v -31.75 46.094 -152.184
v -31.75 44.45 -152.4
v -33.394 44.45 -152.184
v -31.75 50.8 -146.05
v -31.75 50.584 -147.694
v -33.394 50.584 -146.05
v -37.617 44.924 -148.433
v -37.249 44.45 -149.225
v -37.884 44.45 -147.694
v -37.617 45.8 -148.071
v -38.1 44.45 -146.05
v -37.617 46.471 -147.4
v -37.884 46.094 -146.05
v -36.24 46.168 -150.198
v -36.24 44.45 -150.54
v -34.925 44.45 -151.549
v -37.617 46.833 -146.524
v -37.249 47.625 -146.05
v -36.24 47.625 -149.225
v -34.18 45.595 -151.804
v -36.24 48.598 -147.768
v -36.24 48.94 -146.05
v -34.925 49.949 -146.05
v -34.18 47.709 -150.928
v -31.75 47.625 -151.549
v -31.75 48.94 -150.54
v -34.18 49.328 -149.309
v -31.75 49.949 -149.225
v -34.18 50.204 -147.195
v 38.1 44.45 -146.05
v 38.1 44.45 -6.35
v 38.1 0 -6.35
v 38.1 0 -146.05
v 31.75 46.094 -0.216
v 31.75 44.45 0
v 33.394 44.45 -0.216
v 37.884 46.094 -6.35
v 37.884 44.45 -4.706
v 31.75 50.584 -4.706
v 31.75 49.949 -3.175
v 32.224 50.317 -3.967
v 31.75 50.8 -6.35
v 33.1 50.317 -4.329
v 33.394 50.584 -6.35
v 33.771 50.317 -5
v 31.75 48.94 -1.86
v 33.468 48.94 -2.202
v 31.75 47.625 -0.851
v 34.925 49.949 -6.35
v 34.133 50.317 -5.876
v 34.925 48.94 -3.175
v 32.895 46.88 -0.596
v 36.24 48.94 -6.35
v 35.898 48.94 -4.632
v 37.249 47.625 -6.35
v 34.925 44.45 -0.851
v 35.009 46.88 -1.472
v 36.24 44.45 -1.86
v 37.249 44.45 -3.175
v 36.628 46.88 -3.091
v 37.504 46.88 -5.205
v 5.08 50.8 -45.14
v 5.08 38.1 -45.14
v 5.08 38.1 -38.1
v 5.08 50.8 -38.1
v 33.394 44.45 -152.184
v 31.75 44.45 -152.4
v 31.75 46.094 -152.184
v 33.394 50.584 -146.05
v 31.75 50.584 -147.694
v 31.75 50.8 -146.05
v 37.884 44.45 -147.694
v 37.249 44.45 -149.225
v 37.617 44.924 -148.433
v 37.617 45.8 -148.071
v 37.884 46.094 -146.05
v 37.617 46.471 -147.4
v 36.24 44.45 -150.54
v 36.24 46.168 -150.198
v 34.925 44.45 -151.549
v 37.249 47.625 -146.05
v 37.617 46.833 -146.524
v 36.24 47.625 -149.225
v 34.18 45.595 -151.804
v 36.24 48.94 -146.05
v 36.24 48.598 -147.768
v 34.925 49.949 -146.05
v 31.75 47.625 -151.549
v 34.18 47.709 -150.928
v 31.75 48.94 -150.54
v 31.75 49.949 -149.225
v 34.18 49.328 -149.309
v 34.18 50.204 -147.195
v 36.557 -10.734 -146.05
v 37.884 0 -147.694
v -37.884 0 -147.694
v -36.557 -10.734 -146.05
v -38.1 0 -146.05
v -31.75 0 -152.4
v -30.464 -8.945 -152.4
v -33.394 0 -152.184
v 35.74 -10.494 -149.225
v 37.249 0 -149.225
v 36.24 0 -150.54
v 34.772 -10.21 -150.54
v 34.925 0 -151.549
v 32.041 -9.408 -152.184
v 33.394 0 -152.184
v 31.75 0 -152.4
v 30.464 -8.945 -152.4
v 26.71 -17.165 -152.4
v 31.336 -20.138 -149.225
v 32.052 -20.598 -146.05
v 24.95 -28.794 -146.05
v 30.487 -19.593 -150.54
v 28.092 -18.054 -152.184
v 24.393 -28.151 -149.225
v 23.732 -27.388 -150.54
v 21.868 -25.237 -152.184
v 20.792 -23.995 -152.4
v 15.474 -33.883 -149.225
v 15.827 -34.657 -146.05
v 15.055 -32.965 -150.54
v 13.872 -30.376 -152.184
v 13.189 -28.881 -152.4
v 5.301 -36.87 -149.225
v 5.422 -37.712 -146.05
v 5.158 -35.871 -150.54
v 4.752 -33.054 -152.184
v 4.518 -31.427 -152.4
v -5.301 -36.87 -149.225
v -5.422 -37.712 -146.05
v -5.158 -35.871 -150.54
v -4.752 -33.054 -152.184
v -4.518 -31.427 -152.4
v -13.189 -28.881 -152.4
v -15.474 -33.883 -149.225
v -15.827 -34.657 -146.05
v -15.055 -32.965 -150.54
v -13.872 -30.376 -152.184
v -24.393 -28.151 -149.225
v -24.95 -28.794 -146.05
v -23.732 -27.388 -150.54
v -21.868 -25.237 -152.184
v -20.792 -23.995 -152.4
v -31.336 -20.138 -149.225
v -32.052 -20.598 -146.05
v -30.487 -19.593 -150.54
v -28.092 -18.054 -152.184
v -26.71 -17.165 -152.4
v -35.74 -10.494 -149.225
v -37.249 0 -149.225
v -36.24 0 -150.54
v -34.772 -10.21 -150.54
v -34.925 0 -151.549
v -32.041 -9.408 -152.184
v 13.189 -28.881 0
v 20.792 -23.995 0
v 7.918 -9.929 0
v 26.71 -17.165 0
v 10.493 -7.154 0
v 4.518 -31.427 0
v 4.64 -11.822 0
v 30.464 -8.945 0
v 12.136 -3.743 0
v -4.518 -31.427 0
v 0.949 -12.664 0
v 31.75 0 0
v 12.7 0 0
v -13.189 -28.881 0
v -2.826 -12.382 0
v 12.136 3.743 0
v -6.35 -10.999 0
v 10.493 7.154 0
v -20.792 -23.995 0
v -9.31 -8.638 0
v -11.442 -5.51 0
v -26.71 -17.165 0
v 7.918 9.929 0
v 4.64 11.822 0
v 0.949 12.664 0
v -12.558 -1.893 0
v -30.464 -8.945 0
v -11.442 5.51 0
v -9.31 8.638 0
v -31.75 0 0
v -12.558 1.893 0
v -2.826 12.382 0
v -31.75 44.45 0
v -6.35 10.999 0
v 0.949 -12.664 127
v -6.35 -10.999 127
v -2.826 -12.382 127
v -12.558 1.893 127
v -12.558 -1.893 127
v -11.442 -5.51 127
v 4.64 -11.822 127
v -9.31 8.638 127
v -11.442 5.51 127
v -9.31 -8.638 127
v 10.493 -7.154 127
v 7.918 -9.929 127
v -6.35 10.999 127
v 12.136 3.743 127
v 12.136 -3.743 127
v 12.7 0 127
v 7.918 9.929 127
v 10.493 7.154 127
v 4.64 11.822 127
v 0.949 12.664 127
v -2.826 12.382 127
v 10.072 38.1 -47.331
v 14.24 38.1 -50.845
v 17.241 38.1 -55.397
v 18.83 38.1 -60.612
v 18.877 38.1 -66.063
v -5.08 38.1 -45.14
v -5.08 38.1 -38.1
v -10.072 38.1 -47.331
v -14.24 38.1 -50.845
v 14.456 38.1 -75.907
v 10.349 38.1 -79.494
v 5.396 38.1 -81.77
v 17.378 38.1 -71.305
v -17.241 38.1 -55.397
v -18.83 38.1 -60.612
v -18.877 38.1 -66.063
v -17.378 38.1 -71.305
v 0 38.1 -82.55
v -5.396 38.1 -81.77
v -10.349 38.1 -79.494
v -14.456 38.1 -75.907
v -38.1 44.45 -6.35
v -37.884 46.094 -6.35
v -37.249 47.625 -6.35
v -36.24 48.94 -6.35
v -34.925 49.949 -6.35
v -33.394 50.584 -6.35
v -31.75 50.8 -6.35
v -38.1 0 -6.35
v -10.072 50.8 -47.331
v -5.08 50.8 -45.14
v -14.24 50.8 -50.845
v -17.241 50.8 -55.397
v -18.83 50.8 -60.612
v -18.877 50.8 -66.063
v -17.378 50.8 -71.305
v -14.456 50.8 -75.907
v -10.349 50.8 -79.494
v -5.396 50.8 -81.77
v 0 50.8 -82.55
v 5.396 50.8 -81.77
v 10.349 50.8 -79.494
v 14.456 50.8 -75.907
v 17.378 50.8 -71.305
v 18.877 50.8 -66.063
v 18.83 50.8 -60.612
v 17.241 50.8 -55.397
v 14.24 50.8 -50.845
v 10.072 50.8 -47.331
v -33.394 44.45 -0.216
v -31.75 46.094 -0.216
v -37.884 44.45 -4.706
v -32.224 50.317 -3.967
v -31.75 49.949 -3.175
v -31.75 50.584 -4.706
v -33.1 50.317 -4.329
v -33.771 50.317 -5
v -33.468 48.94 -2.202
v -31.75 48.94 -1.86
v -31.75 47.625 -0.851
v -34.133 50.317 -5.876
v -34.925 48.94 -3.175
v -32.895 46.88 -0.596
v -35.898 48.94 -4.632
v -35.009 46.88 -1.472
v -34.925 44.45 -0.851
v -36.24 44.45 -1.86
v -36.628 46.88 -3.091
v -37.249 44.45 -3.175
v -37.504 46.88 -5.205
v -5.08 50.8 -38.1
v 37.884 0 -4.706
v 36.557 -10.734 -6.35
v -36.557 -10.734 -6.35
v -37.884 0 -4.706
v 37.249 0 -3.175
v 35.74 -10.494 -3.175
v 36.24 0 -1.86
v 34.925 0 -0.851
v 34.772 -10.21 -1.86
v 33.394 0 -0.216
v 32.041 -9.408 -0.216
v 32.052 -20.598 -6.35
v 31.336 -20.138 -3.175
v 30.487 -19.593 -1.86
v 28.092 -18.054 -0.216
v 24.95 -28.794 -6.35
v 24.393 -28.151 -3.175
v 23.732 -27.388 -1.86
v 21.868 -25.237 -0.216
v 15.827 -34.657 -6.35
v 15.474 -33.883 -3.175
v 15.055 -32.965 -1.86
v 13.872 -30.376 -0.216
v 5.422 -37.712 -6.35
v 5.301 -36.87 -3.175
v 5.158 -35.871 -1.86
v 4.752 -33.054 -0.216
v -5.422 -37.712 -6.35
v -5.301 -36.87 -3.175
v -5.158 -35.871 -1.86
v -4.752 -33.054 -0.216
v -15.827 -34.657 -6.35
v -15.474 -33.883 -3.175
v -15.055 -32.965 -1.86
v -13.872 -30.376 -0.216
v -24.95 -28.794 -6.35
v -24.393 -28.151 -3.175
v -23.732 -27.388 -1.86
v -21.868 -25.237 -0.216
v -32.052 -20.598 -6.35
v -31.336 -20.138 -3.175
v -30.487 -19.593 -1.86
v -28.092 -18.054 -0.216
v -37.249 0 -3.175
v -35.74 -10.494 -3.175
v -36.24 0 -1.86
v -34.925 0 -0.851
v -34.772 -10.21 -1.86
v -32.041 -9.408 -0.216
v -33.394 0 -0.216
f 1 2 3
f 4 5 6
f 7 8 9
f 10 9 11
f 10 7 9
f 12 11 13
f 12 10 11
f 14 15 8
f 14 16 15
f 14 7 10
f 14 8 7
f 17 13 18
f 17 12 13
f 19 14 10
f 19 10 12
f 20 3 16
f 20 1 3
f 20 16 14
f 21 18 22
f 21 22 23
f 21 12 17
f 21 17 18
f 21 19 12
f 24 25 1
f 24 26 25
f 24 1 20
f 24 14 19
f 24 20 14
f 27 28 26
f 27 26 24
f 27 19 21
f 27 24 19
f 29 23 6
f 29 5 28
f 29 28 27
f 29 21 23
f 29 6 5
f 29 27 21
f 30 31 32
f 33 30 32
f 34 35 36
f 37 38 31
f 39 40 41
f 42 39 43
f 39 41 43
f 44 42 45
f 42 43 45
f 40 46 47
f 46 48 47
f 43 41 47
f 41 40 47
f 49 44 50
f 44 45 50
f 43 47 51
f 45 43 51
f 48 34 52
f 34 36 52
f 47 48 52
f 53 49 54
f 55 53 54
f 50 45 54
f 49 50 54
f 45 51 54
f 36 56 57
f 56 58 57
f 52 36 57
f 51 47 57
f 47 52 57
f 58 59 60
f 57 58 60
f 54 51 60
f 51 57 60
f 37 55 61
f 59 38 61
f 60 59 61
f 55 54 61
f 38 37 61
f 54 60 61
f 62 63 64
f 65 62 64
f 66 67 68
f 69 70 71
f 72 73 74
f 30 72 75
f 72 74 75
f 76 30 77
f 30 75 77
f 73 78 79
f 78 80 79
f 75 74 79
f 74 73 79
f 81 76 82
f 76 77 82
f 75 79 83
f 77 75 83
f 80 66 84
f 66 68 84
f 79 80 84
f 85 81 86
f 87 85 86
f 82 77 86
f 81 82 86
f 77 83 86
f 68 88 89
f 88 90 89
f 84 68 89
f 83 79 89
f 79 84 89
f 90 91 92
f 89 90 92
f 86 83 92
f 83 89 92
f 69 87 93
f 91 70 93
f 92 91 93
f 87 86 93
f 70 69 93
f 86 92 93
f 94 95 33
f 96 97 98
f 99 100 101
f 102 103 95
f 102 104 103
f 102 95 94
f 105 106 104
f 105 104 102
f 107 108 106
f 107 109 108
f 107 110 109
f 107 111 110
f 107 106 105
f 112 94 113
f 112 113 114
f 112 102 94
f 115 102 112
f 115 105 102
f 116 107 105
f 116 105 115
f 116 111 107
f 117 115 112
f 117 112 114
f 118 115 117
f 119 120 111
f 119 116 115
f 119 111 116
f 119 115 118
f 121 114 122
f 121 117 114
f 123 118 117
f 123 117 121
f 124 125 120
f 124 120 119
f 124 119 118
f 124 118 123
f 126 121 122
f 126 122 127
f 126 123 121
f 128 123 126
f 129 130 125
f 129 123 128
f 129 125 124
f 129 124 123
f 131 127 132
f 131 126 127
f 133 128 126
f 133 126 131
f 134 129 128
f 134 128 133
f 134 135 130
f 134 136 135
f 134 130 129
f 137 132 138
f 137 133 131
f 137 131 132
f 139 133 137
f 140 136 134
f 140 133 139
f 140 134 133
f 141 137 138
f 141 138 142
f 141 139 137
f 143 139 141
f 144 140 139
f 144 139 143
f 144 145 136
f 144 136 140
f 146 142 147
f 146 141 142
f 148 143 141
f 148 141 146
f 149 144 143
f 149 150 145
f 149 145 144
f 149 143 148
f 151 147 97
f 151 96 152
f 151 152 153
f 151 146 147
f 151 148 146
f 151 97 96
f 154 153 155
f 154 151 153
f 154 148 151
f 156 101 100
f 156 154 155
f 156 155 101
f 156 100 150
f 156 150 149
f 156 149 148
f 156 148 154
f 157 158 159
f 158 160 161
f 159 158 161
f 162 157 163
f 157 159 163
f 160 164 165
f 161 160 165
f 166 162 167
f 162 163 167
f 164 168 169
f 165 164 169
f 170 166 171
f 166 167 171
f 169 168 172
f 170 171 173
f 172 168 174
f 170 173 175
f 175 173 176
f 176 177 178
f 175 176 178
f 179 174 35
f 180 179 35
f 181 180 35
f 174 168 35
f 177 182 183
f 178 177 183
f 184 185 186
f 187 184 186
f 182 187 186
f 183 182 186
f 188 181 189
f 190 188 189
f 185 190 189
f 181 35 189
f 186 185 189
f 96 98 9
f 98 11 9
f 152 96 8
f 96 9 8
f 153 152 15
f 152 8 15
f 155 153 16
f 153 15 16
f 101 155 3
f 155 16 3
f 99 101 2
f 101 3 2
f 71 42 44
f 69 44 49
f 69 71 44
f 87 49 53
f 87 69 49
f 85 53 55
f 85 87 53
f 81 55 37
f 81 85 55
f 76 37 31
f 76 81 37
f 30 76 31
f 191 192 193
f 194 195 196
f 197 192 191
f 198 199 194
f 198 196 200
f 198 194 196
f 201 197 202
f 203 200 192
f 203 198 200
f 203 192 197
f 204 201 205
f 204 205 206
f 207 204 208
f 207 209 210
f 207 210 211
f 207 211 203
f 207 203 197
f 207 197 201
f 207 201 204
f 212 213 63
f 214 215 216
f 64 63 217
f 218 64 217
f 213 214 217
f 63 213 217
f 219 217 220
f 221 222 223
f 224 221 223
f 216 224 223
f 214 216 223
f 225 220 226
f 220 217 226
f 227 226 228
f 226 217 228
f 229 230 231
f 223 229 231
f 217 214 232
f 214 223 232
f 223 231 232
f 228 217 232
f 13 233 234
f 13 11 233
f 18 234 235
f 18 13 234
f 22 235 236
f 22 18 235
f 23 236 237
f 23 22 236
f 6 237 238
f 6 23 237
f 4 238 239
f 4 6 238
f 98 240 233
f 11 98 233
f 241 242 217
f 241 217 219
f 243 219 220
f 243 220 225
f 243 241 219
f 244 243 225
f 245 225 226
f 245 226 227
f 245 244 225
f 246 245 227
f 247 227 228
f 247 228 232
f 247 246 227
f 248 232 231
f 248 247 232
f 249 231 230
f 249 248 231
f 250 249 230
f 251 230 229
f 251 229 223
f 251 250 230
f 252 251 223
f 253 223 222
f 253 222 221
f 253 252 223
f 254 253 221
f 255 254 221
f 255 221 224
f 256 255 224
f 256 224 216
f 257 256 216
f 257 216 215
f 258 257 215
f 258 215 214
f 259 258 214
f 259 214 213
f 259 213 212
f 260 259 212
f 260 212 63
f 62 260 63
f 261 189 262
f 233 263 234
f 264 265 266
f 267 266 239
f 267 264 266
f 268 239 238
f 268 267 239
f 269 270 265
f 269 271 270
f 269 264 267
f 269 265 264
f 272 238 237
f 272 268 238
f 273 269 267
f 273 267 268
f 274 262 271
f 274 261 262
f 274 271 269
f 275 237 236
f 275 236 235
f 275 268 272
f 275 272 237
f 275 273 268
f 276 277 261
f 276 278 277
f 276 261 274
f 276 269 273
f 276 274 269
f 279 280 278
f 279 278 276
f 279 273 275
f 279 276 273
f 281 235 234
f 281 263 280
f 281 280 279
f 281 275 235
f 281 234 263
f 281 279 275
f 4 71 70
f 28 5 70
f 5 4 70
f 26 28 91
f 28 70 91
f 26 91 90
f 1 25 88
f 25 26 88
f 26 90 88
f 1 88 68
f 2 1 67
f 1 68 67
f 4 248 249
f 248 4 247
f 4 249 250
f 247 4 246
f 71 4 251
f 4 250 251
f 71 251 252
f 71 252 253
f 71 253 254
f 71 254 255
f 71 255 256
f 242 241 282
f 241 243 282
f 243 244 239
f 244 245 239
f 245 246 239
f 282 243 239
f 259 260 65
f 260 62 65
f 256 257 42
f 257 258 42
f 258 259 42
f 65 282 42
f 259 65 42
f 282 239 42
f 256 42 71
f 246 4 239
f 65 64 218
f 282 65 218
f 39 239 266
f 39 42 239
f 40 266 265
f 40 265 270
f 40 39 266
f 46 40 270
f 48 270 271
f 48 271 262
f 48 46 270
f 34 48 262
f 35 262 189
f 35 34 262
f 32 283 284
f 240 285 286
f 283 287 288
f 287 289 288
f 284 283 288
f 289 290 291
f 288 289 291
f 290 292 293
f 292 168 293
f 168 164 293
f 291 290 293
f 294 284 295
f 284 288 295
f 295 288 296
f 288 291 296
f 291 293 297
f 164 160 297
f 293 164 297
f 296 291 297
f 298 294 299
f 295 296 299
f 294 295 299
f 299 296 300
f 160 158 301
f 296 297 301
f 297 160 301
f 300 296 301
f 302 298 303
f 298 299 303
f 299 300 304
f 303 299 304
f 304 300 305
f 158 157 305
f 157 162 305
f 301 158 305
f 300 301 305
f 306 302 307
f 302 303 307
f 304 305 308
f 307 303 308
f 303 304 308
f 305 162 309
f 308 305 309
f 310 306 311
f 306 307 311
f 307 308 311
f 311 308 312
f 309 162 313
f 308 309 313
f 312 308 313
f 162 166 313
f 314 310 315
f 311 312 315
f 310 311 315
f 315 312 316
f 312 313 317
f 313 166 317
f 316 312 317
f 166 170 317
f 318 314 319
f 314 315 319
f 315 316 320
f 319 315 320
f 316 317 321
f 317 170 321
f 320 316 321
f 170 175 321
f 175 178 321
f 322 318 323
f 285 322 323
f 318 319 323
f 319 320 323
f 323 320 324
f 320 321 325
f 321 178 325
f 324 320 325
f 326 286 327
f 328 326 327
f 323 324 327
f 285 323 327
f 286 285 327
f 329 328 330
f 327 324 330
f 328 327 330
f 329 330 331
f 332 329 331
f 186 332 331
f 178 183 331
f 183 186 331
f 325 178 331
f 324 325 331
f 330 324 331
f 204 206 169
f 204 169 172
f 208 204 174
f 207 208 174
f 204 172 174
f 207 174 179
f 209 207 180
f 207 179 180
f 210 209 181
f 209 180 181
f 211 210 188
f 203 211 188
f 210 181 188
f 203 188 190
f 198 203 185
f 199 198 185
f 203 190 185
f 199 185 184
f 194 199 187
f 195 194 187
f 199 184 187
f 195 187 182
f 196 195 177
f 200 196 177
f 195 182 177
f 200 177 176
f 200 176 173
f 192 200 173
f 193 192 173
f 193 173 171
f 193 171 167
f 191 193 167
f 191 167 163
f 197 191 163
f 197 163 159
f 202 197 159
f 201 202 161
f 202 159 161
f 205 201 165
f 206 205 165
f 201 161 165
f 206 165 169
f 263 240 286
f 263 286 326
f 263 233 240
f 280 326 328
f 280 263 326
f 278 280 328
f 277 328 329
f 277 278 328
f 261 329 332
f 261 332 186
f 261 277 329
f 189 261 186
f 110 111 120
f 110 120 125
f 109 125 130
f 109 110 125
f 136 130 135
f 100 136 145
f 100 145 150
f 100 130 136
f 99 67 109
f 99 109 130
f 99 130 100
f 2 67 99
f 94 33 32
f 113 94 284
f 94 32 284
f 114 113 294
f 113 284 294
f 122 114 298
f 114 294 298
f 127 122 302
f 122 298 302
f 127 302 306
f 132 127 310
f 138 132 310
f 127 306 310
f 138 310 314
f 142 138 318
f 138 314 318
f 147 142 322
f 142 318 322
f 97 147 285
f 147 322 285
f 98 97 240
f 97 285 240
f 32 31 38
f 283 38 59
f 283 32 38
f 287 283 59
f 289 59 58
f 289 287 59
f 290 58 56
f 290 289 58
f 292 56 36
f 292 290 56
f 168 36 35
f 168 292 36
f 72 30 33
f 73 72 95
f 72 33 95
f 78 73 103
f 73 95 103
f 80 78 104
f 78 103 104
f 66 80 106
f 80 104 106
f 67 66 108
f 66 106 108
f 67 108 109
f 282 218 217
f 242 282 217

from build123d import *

# Parameters (mm, degrees)
BOSS_EXTRUDE1_DEPTH = 152.4
SKETCH2_R           = 12.7
BOSS_EXTRUDE2_DEPTH = 127
CUT_EXTRUDE1_DEPTH  = 12.7
FILLET1_R           = 6.35


with BuildPart() as part:
    # Sketch1 → Boss-Extrude1 (new body)
    with BuildSketch(Plane.XY):
        with BuildLine():
            Line((-38.1, 0), (-38.1, 50.8))
            Line((-38.1, 50.8), (38.1, 50.8))
            Line((38.1, 50.8), (38.1, 0))
            ThreePointArc((38.1, 0), (0, -38.1), (-38.1, 0))
        make_face()
    extrude(amount=-BOSS_EXTRUDE1_DEPTH)

    # Sketch2 → Boss-Extrude2 (add)
    with BuildSketch(Plane.XY):
        Circle(SKETCH2_R)
    extrude(amount=BOSS_EXTRUDE2_DEPTH)

    # Sketch3 → Cut-Extrude1 (cut)
    with BuildSketch(Plane(origin=(0, 50.8, 0), x_dir=(1, 0, 0), z_dir=(0, 1, 0))):
        with BuildLine():
            Line((5.08, 45.139822986), (5.08, 38.1))
            Line((5.08, 38.1), (-5.08, 38.1))
            Line((-5.08, 38.1), (-5.08, 45.139822986))
            ThreePointArc((-5.08, 45.139822986), (0, 82.55), (5.08, 45.139822986))
        make_face()
    extrude(amount=-CUT_EXTRUDE1_DEPTH, mode=Mode.SUBTRACT)

    # Fillet1
    fillet1_edges = [part.edges().sort_by_distance(p)[0] for p in [
        (0, 50.8, -152.4),
        (-38.1, 25.4, -152.4),
        (0, -38.1, -152.4),
        (-38.1, 25.4, 0),
        (0, 50.8, 0),
        (38.1, 25.4, 0),
        (0, -38.1, 0),
        (38.1, 25.4, -152.4),
        (-38.1, 50.8, -76.2),
        (38.1, 50.8, -76.2),
    ]]
    fillet(fillet1_edges, radius=FILLET1_R)


solid = part.part
